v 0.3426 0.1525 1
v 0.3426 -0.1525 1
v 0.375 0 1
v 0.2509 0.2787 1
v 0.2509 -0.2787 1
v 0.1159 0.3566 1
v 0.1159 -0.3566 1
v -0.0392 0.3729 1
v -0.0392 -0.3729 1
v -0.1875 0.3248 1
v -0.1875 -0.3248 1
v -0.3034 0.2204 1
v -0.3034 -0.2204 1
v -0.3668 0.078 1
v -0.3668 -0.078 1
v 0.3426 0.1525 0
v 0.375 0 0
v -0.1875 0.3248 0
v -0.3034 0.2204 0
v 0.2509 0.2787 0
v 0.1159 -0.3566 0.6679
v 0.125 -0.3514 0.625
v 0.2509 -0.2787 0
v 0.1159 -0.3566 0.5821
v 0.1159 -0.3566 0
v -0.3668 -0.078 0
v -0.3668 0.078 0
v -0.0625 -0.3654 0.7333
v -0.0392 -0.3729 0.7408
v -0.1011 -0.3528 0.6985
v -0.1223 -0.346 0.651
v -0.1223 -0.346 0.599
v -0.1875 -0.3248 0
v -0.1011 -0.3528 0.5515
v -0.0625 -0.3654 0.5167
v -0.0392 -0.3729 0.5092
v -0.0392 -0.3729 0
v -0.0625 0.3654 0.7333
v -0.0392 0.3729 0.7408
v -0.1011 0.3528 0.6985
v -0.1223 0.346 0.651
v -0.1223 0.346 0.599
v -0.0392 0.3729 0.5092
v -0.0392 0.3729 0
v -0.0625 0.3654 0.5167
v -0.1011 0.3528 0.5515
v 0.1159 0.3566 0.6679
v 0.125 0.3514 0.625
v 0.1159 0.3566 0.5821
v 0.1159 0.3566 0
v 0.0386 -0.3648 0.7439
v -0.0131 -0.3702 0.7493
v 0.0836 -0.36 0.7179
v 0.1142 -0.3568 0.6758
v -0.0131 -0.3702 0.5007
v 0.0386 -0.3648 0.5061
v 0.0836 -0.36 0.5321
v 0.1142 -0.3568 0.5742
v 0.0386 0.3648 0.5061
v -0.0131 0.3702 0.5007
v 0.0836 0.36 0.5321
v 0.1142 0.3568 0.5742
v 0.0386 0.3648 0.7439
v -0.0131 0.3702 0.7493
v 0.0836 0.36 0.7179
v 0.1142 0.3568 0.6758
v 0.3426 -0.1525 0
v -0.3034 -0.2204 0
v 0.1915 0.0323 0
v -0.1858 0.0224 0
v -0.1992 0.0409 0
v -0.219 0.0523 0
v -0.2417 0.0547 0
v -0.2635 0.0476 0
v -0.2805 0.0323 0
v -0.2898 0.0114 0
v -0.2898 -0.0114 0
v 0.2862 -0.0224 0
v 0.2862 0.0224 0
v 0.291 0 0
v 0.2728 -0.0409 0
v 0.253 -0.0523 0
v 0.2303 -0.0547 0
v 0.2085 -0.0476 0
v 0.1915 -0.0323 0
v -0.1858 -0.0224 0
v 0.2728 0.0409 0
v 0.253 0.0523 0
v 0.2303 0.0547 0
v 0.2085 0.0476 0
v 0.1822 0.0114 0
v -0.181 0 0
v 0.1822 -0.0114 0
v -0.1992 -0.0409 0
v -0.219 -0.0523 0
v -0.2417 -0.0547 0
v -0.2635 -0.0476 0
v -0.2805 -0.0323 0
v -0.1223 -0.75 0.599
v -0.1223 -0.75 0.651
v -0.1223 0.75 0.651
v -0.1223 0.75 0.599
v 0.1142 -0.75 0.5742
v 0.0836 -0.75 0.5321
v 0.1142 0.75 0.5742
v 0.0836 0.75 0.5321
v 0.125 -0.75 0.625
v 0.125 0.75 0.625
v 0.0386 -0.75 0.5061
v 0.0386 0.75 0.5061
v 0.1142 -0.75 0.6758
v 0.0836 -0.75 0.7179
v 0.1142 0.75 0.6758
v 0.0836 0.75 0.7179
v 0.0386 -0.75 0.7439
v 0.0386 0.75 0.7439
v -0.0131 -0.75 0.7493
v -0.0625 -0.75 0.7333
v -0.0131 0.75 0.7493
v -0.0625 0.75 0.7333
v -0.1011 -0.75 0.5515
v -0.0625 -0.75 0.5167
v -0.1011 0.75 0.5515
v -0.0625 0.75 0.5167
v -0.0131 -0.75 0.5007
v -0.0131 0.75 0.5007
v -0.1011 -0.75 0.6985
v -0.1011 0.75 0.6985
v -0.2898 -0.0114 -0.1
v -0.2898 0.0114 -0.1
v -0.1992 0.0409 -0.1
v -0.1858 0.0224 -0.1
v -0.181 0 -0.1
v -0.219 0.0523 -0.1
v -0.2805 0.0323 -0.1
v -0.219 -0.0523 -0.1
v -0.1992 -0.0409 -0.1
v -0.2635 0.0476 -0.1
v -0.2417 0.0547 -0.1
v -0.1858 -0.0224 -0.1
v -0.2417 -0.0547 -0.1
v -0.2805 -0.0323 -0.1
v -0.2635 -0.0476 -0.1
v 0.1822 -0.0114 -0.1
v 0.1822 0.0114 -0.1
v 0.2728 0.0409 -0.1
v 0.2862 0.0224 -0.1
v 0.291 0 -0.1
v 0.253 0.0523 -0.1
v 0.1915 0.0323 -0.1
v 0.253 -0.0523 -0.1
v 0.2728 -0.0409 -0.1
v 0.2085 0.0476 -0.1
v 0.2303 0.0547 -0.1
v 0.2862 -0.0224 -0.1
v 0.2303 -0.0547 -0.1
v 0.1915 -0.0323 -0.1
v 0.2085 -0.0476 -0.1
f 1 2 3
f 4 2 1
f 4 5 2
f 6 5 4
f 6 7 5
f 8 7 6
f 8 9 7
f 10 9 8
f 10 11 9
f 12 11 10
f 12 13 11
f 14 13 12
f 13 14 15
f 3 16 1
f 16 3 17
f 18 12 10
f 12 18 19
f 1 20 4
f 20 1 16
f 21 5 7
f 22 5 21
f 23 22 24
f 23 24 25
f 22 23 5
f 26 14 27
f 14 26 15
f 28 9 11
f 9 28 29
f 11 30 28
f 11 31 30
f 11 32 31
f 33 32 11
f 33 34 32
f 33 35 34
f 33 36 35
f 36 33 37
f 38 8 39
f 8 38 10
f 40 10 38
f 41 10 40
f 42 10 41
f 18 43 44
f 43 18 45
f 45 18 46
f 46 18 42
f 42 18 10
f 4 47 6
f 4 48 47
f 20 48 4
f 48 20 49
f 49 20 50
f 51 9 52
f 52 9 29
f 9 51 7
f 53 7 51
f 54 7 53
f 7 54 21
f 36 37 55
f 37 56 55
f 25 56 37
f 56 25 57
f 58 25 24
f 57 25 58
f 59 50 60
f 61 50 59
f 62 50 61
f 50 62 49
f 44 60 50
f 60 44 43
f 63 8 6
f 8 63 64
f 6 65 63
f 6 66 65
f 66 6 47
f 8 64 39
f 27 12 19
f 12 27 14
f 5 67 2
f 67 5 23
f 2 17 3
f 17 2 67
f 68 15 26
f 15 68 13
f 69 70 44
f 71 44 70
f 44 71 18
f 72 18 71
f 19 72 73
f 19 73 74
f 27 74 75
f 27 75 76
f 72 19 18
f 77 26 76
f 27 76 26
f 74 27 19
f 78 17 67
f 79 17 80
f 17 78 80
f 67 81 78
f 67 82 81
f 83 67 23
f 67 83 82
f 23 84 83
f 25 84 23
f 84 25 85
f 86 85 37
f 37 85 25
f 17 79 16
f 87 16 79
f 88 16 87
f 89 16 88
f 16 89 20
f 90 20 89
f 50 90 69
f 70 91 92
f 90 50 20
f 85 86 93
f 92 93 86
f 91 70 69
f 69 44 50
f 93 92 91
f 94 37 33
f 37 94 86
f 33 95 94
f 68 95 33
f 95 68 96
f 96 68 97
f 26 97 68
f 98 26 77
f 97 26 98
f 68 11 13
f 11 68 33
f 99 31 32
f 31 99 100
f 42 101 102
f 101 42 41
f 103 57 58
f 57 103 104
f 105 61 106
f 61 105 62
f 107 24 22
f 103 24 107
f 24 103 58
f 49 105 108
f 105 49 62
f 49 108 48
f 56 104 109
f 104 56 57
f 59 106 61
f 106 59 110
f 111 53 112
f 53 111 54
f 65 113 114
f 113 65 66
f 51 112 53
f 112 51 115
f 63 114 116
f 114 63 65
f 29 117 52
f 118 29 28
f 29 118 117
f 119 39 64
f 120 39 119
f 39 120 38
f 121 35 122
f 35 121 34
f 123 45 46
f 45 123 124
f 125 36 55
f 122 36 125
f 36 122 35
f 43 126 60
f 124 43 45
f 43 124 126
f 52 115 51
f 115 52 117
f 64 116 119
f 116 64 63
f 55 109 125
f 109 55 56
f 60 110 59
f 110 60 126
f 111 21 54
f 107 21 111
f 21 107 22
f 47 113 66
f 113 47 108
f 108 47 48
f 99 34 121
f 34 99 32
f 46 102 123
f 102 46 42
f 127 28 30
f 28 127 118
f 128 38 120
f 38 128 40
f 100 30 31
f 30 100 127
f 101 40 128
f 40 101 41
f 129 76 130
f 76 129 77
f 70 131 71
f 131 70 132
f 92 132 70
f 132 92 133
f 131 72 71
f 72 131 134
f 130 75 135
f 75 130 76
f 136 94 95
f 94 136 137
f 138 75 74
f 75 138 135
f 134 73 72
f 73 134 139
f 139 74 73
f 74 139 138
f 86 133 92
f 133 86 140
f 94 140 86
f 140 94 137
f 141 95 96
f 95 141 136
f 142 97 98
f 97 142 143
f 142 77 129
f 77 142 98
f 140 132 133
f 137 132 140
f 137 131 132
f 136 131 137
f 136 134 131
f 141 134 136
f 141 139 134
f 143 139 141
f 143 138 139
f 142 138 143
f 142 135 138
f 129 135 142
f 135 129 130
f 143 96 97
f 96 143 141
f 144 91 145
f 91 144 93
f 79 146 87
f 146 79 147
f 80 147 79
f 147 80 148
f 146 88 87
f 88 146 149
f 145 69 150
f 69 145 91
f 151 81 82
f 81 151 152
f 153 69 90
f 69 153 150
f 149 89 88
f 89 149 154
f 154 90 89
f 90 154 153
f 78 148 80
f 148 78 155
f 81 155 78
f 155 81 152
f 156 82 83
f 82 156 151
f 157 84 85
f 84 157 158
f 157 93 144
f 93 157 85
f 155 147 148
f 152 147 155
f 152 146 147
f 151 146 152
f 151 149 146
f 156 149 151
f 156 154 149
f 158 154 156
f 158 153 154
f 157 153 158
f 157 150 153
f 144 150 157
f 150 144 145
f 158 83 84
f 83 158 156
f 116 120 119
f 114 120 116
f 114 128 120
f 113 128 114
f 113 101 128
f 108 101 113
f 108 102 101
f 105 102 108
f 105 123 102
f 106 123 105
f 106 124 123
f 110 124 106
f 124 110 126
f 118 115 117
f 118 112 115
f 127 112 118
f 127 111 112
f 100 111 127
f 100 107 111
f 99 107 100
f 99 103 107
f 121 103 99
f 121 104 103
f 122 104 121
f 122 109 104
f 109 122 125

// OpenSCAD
$fn = 15;


union() {
	difference() {
		difference() {
			cylinder(center = false, d = 0.7500000000, h = 1.0000000000);
			translate(v = [0, 0, -0.3750000000]) {
				translate(v = [-0.0, -0.0, 1.0]) {
					rotate(a = -180.0, v = [1.0, 0.0, -0.0]) {
						rotate(a = [90.0000000000, 0.0000000000, 0.0000000000]) {
							cylinder(center = true, d = 0.2500000000, h = 1.5000000000);
						}
					}
				}
			}
		}
		union() {
			translate(v = [-0.2360000000, 0, 0]) {
				cylinder(center = false, d = 0.1250000000, h = 0.3750000000);
			}
			translate(v = [-0.2360000000, 0, 0]) {
				translate(v = [-0.0, -0.0, -0.1]) {
					cylinder(center = false, d = 0.1100000000, h = 0.1000000000);
				}
			}
		}
		union() {
			translate(v = [0.2360000000, 0, 0]) {
				cylinder(center = false, d = 0.1250000000, h = 0.3750000000);
			}
			translate(v = [0.2360000000, 0, 0]) {
				translate(v = [-0.0, -0.0, -0.1]) {
					cylinder(center = false, d = 0.1100000000, h = 0.1000000000);
				}
			}
		}
	}
	translate(v = [0, 0, -0.3750000000]) {
		translate(v = [-0.0, -0.0, 1.0]) {
			rotate(a = -180.0, v = [1.0, 0.0, -0.0]) {
				rotate(a = [90.0000000000, 0.0000000000, 0.0000000000]) {
					cylinder(center = true, d = 0.2500000000, h = 1.5000000000);
				}
			}
		}
	}
	union() {
		translate(v = [-0.2360000000, 0, 0]) {
			cylinder(center = false, d = 0.1250000000, h = 0.3750000000);
		}
		translate(v = [-0.2360000000, 0, 0]) {
			translate(v = [-0.0, -0.0, -0.1]) {
				cylinder(center = false, d = 0.1100000000, h = 0.1000000000);
			}
		}
	}
	union() {
		translate(v = [0.2360000000, 0, 0]) {
			cylinder(center = false, d = 0.1250000000, h = 0.3750000000);
		}
		translate(v = [0.2360000000, 0, 0]) {
			translate(v = [-0.0, -0.0, -0.1]) {
				cylinder(center = false, d = 0.1100000000, h = 0.1000000000);
			}
		}
	}
}
